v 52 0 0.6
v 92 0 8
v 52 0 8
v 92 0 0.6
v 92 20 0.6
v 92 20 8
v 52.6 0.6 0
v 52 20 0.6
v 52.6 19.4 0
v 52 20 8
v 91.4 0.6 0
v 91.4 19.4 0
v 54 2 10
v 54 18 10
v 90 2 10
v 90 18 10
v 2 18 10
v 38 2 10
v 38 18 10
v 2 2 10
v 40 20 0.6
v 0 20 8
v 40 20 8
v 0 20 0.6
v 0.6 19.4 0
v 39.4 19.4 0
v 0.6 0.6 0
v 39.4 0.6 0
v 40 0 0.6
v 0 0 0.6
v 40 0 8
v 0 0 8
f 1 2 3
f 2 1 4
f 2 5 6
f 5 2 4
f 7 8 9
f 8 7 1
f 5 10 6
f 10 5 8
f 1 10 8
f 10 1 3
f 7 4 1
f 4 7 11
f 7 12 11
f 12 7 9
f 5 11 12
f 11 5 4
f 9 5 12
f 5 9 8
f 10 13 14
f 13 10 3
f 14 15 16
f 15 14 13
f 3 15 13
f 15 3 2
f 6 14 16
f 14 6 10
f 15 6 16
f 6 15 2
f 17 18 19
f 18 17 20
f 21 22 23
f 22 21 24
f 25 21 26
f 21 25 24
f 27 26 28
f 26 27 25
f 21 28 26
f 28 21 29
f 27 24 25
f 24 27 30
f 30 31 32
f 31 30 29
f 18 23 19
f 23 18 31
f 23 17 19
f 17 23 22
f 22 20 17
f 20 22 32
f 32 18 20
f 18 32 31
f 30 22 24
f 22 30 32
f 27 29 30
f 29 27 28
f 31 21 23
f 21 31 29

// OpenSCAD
// Experiment: can one hull form both an upper chamfer and elephant-foot relief?
// This is a deliberately CONVEX straight-arm test piece, not the full L bracket.
// The full bracket has a concave inside corner, a radius, end chamfers and
// captive-nut openings. Do not substitute this prototype for corner_bracket.scad.

/* [Experiment] */
view = "comparison"; // [comparison, combined, reference, xor, layers]
length = 40;
width = 20;
height = 10;
upper_chamfer = 2; // comparable to the bracket's side_edge_chamfer
elephant_foot = 0.6; // experimental print-relief amount
separation = 12;

/* [Hidden] */
eps = 0.001;
assert(length > 2 * max(upper_chamfer, elephant_foot));
assert(width > 2 * max(upper_chamfer, elephant_foot));
assert(height > upper_chamfer + elephant_foot + 4 * eps);

// A rectangular horizontal layer, inset equally from four sides.
// A tiny thickness makes this legal 3D input for hull().
module layer(z, inset) {
    translate([inset, inset, z])
        cube([length - 2 * inset, width - 2 * inset, eps]);
}

// All four outlines belong to ONE hull() operation.
// Bottom-to-middle slope = elephant-foot relief.
// Middle-to-top slope = upper chamfer.
// The intervening straight part remains at full size.
module combined_hull() {
    hull() {
        layer(0, elephant_foot);
        layer(elephant_foot, 0);
        layer(height - upper_chamfer - eps, 0);
        layer(height - eps, upper_chamfer);
    }
}

// Comparison reference: each section is separately lofted.
// This is independent of the single four-layer hull construction.
module reference_sections() {
    union() {
        hull() { layer(0, elephant_foot); layer(elephant_foot, 0); }
        hull() { layer(elephant_foot, 0); layer(height - upper_chamfer - eps, 0); }
        hull() { layer(height - upper_chamfer - eps, 0); layer(height - eps, upper_chamfer); }
    }
}

module symmetric_difference() {
    union() {
        difference() { combined_hull(); reference_sections(); }
        difference() { reference_sections(); combined_hull(); }
    }
}

if (view == "combined") combined_hull();
else if (view == "reference") reference_sections();
else if (view == "xor") symmetric_difference();
else if (view == "layers") {
    color("orange") layer(0, elephant_foot);
    color("gold") layer(elephant_foot, 0);
    color("cyan") layer(height - upper_chamfer - eps, 0);
    color("blue") layer(height - eps, upper_chamfer);
} else {
    color("steelblue") combined_hull();
    translate([length + separation, 0, 0]) color("orange") reference_sections();
}
